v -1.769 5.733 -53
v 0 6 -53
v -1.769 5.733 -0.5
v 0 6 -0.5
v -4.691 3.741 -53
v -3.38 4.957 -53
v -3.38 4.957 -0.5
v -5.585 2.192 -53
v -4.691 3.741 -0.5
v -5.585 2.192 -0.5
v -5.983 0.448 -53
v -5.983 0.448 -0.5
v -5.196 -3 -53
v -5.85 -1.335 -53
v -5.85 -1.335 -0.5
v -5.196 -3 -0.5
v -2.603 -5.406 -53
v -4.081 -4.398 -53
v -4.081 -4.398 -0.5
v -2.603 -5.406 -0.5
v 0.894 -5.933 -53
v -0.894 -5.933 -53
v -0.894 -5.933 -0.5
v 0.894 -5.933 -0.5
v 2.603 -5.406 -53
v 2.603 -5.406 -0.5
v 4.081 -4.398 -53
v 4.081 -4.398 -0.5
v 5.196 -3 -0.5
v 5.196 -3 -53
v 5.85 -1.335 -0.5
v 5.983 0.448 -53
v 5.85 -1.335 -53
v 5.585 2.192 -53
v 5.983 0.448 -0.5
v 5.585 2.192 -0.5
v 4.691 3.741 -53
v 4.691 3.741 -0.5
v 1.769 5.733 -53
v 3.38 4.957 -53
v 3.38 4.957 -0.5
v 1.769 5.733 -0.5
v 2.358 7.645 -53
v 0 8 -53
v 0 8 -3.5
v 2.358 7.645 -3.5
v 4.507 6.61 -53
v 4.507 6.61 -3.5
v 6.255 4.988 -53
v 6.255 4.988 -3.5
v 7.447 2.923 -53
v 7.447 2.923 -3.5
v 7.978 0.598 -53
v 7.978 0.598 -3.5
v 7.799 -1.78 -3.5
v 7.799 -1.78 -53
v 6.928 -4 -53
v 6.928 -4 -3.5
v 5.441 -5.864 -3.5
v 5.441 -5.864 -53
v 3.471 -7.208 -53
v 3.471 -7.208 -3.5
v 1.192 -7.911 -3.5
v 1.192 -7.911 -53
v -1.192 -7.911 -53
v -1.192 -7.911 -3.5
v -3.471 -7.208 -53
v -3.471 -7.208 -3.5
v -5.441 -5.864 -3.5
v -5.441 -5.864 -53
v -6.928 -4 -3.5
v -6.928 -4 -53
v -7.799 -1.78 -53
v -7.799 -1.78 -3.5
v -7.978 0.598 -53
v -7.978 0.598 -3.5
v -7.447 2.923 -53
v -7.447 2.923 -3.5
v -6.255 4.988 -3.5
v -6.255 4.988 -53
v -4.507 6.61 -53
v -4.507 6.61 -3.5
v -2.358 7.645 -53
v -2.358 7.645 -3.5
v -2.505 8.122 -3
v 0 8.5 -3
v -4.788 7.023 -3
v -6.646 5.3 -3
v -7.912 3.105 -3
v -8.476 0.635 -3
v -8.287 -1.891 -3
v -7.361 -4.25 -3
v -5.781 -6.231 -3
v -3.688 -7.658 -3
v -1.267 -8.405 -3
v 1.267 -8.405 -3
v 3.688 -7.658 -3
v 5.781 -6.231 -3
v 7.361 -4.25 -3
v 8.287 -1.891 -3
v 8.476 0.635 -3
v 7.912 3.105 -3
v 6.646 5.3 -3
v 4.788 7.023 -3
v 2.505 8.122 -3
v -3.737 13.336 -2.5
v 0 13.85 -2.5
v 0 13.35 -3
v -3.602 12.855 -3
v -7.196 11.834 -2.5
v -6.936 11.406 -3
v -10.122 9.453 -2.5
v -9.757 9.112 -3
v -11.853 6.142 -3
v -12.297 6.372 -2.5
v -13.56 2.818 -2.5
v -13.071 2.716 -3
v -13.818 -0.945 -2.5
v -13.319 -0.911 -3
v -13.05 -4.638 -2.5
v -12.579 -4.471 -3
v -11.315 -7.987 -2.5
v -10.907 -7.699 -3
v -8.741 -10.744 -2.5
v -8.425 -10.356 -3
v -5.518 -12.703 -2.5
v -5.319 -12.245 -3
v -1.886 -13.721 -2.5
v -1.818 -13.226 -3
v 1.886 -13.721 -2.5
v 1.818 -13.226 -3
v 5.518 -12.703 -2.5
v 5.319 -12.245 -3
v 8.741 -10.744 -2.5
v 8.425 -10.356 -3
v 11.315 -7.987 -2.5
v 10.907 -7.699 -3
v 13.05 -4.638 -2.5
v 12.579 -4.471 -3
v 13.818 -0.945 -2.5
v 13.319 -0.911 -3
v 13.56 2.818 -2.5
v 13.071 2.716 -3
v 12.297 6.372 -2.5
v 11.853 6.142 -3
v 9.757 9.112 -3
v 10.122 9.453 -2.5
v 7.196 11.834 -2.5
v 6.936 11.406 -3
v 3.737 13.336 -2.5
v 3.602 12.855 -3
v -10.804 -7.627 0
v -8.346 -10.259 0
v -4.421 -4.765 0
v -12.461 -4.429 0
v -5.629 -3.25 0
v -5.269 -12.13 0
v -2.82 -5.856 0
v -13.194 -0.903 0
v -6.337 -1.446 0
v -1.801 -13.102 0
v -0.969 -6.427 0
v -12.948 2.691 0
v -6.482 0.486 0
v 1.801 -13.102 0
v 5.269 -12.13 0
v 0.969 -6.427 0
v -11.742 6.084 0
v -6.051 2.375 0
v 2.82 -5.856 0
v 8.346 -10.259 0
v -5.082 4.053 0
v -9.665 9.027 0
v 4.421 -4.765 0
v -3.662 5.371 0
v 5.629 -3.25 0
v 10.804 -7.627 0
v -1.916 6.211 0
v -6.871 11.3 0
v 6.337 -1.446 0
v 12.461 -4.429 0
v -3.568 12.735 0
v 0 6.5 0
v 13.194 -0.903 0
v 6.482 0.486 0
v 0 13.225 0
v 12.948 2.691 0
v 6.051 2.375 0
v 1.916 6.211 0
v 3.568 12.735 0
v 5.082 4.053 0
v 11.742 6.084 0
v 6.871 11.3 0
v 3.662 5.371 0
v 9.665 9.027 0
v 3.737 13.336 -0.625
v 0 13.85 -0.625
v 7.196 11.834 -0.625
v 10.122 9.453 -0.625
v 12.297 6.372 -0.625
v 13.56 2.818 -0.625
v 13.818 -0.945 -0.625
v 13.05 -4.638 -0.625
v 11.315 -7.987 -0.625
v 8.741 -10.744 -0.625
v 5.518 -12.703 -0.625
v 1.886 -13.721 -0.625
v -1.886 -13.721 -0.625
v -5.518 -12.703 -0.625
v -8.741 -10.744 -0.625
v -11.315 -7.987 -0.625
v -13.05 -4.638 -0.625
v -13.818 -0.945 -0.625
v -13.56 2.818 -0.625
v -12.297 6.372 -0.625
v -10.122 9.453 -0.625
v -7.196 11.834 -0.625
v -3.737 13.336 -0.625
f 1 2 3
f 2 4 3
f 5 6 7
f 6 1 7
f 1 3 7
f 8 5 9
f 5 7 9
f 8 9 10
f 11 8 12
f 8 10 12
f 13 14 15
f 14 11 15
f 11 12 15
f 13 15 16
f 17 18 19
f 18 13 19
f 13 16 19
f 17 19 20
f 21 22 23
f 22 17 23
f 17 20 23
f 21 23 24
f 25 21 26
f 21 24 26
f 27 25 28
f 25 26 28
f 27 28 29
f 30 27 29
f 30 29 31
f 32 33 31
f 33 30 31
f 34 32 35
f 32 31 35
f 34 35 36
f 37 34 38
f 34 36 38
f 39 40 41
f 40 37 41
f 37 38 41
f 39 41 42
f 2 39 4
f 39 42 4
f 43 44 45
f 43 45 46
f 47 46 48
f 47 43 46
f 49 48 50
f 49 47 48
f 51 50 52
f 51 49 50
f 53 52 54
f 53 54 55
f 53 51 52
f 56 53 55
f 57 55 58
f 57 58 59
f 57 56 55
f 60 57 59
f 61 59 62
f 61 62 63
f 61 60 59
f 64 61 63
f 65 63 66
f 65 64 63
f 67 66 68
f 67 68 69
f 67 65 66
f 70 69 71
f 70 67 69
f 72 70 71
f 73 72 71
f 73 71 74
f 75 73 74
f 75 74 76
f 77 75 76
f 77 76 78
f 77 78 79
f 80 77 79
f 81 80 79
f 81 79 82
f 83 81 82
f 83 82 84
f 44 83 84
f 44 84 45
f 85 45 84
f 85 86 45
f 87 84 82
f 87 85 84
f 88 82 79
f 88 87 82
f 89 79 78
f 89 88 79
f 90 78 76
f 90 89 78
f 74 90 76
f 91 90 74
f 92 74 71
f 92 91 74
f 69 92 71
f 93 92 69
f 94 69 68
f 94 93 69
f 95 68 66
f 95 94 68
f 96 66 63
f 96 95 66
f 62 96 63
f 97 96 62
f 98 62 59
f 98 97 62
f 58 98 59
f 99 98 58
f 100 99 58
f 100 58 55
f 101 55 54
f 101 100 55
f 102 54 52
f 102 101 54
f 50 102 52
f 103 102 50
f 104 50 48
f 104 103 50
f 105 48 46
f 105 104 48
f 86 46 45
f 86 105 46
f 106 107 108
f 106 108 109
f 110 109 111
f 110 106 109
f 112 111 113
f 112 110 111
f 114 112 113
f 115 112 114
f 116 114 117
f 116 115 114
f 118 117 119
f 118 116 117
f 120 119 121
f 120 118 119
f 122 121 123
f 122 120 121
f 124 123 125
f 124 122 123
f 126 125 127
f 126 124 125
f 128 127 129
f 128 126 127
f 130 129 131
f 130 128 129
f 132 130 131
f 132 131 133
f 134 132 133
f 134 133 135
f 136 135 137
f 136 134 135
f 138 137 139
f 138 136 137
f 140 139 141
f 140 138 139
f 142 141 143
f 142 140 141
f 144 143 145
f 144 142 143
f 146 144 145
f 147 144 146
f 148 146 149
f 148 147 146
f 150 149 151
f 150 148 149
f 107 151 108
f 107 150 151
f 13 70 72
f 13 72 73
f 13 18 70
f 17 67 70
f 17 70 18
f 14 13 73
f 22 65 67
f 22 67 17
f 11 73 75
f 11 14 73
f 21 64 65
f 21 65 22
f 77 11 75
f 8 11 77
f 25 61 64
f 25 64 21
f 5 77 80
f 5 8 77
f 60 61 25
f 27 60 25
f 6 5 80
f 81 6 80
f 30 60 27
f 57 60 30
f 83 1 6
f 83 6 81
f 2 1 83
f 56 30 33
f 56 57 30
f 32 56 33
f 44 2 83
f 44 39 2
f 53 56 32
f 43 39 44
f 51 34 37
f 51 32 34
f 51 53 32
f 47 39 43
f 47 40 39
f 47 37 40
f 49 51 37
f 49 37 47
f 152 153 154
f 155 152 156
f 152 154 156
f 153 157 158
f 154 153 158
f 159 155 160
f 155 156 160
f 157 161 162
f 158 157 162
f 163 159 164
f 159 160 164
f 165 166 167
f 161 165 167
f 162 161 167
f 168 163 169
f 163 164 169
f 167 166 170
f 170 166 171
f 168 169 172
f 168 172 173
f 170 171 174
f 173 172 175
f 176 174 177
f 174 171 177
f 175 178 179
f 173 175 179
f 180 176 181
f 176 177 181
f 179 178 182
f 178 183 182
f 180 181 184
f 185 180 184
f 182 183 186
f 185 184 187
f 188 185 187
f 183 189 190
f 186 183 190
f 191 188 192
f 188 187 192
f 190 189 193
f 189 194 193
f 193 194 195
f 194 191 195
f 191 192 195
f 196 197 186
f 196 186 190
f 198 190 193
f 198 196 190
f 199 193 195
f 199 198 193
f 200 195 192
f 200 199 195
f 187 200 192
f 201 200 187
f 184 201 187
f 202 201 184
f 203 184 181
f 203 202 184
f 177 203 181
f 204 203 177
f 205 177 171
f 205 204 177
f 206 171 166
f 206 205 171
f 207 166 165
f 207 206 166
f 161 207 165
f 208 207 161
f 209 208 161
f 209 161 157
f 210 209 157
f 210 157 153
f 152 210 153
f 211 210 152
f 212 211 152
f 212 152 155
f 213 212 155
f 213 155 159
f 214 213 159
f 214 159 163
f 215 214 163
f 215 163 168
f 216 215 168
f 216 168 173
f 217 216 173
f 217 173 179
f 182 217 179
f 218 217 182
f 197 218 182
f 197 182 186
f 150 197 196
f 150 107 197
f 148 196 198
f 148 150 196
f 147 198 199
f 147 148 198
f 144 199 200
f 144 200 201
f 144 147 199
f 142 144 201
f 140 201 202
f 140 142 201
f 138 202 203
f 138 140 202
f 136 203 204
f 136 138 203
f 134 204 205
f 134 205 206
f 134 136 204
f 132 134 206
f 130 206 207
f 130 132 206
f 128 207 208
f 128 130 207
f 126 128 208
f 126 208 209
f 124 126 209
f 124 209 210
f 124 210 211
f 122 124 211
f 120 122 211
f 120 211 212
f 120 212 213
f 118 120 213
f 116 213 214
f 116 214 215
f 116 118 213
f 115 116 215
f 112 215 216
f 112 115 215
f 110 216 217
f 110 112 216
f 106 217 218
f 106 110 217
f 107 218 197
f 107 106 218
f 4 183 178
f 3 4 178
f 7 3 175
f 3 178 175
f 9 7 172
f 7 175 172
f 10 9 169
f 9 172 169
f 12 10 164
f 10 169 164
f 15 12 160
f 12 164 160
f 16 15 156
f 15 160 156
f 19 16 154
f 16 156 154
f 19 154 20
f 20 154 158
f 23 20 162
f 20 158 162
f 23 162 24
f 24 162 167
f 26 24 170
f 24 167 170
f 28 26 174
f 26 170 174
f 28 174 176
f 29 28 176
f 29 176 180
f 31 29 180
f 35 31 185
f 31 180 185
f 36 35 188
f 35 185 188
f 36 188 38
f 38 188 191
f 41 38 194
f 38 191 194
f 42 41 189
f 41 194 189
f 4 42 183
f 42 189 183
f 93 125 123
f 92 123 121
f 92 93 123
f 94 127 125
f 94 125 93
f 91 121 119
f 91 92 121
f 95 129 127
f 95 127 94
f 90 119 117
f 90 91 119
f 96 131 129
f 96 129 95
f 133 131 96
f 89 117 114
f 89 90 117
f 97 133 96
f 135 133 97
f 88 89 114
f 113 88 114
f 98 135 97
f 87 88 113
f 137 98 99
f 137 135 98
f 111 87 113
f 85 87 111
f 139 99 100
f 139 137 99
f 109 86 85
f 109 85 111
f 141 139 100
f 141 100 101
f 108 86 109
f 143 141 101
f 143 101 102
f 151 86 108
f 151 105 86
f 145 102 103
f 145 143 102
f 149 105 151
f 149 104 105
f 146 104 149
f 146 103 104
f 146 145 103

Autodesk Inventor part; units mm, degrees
ref_plane "YZ Plane" through (0, 0, 0) normal (1, 0, 0) x (0, 1, 0)
ref_plane "XZ Plane" through (0, 0, 0) normal (0, 1, 0) x (-1, 0, 0)
ref_plane "XY Plane" through (0, 0, 0) normal (0, 0, 1) x (1, 0, 0)
sketch "Esquisse1" plane through (0, 0, 0) normal (1, 0, 0) x (0, 1, 0)
  line L0 (13.35, -3) -> (8.5, -3)
  line L1 (8.5, -3) -> (8, -3.5)
  line L2 (8, -3.5) -> (8, -53)
  line L3 (8, -53) -> (6, -53)
  line L4 (6, -53) -> (6, -0.5)
  line L5 (6, -0.5) -> (6.5, 0)
  line L6 (6.5, 0) -> (13.225, 0)
  line L7 (13.225, 0) -> (13.85, -0.625)
  line L8 (13.85, -0.625) -> (13.85, -2.5)
  line L9 (13.85, -2.5) -> (13.35, -3)
  line L10 (0, 8.9692) -> (0, -52.1325)
  point P0 (0, 0)
  dimension "d0" = 3
  dimension "d3" = 0.5
  dimension "d4" = 0.5
  dimension "d5" = 0.5
  dimension "d6" = 0.5
  dimension "d7" = 0.625
  dimension "d8" = 0.625
  dimension "d9" = 0.5
  dimension "d10" = 0.5
  dimension "d12" = 50
  dimension "d15" = 12
  dimension "d16" = 27.7
  dimension "d17" = 16
revolve "Révolution1" add sketch "Esquisse1" angle 360 about axis through (0, 0, 8.9692) along (0, 0, -1)
equation "\"d4\" = d3"
equation "\"d6\" = d5"
equation "\"d8\" = d7"
equation "\"d10\" = d9"
properties part number "douille" material "Plastique ABS"
